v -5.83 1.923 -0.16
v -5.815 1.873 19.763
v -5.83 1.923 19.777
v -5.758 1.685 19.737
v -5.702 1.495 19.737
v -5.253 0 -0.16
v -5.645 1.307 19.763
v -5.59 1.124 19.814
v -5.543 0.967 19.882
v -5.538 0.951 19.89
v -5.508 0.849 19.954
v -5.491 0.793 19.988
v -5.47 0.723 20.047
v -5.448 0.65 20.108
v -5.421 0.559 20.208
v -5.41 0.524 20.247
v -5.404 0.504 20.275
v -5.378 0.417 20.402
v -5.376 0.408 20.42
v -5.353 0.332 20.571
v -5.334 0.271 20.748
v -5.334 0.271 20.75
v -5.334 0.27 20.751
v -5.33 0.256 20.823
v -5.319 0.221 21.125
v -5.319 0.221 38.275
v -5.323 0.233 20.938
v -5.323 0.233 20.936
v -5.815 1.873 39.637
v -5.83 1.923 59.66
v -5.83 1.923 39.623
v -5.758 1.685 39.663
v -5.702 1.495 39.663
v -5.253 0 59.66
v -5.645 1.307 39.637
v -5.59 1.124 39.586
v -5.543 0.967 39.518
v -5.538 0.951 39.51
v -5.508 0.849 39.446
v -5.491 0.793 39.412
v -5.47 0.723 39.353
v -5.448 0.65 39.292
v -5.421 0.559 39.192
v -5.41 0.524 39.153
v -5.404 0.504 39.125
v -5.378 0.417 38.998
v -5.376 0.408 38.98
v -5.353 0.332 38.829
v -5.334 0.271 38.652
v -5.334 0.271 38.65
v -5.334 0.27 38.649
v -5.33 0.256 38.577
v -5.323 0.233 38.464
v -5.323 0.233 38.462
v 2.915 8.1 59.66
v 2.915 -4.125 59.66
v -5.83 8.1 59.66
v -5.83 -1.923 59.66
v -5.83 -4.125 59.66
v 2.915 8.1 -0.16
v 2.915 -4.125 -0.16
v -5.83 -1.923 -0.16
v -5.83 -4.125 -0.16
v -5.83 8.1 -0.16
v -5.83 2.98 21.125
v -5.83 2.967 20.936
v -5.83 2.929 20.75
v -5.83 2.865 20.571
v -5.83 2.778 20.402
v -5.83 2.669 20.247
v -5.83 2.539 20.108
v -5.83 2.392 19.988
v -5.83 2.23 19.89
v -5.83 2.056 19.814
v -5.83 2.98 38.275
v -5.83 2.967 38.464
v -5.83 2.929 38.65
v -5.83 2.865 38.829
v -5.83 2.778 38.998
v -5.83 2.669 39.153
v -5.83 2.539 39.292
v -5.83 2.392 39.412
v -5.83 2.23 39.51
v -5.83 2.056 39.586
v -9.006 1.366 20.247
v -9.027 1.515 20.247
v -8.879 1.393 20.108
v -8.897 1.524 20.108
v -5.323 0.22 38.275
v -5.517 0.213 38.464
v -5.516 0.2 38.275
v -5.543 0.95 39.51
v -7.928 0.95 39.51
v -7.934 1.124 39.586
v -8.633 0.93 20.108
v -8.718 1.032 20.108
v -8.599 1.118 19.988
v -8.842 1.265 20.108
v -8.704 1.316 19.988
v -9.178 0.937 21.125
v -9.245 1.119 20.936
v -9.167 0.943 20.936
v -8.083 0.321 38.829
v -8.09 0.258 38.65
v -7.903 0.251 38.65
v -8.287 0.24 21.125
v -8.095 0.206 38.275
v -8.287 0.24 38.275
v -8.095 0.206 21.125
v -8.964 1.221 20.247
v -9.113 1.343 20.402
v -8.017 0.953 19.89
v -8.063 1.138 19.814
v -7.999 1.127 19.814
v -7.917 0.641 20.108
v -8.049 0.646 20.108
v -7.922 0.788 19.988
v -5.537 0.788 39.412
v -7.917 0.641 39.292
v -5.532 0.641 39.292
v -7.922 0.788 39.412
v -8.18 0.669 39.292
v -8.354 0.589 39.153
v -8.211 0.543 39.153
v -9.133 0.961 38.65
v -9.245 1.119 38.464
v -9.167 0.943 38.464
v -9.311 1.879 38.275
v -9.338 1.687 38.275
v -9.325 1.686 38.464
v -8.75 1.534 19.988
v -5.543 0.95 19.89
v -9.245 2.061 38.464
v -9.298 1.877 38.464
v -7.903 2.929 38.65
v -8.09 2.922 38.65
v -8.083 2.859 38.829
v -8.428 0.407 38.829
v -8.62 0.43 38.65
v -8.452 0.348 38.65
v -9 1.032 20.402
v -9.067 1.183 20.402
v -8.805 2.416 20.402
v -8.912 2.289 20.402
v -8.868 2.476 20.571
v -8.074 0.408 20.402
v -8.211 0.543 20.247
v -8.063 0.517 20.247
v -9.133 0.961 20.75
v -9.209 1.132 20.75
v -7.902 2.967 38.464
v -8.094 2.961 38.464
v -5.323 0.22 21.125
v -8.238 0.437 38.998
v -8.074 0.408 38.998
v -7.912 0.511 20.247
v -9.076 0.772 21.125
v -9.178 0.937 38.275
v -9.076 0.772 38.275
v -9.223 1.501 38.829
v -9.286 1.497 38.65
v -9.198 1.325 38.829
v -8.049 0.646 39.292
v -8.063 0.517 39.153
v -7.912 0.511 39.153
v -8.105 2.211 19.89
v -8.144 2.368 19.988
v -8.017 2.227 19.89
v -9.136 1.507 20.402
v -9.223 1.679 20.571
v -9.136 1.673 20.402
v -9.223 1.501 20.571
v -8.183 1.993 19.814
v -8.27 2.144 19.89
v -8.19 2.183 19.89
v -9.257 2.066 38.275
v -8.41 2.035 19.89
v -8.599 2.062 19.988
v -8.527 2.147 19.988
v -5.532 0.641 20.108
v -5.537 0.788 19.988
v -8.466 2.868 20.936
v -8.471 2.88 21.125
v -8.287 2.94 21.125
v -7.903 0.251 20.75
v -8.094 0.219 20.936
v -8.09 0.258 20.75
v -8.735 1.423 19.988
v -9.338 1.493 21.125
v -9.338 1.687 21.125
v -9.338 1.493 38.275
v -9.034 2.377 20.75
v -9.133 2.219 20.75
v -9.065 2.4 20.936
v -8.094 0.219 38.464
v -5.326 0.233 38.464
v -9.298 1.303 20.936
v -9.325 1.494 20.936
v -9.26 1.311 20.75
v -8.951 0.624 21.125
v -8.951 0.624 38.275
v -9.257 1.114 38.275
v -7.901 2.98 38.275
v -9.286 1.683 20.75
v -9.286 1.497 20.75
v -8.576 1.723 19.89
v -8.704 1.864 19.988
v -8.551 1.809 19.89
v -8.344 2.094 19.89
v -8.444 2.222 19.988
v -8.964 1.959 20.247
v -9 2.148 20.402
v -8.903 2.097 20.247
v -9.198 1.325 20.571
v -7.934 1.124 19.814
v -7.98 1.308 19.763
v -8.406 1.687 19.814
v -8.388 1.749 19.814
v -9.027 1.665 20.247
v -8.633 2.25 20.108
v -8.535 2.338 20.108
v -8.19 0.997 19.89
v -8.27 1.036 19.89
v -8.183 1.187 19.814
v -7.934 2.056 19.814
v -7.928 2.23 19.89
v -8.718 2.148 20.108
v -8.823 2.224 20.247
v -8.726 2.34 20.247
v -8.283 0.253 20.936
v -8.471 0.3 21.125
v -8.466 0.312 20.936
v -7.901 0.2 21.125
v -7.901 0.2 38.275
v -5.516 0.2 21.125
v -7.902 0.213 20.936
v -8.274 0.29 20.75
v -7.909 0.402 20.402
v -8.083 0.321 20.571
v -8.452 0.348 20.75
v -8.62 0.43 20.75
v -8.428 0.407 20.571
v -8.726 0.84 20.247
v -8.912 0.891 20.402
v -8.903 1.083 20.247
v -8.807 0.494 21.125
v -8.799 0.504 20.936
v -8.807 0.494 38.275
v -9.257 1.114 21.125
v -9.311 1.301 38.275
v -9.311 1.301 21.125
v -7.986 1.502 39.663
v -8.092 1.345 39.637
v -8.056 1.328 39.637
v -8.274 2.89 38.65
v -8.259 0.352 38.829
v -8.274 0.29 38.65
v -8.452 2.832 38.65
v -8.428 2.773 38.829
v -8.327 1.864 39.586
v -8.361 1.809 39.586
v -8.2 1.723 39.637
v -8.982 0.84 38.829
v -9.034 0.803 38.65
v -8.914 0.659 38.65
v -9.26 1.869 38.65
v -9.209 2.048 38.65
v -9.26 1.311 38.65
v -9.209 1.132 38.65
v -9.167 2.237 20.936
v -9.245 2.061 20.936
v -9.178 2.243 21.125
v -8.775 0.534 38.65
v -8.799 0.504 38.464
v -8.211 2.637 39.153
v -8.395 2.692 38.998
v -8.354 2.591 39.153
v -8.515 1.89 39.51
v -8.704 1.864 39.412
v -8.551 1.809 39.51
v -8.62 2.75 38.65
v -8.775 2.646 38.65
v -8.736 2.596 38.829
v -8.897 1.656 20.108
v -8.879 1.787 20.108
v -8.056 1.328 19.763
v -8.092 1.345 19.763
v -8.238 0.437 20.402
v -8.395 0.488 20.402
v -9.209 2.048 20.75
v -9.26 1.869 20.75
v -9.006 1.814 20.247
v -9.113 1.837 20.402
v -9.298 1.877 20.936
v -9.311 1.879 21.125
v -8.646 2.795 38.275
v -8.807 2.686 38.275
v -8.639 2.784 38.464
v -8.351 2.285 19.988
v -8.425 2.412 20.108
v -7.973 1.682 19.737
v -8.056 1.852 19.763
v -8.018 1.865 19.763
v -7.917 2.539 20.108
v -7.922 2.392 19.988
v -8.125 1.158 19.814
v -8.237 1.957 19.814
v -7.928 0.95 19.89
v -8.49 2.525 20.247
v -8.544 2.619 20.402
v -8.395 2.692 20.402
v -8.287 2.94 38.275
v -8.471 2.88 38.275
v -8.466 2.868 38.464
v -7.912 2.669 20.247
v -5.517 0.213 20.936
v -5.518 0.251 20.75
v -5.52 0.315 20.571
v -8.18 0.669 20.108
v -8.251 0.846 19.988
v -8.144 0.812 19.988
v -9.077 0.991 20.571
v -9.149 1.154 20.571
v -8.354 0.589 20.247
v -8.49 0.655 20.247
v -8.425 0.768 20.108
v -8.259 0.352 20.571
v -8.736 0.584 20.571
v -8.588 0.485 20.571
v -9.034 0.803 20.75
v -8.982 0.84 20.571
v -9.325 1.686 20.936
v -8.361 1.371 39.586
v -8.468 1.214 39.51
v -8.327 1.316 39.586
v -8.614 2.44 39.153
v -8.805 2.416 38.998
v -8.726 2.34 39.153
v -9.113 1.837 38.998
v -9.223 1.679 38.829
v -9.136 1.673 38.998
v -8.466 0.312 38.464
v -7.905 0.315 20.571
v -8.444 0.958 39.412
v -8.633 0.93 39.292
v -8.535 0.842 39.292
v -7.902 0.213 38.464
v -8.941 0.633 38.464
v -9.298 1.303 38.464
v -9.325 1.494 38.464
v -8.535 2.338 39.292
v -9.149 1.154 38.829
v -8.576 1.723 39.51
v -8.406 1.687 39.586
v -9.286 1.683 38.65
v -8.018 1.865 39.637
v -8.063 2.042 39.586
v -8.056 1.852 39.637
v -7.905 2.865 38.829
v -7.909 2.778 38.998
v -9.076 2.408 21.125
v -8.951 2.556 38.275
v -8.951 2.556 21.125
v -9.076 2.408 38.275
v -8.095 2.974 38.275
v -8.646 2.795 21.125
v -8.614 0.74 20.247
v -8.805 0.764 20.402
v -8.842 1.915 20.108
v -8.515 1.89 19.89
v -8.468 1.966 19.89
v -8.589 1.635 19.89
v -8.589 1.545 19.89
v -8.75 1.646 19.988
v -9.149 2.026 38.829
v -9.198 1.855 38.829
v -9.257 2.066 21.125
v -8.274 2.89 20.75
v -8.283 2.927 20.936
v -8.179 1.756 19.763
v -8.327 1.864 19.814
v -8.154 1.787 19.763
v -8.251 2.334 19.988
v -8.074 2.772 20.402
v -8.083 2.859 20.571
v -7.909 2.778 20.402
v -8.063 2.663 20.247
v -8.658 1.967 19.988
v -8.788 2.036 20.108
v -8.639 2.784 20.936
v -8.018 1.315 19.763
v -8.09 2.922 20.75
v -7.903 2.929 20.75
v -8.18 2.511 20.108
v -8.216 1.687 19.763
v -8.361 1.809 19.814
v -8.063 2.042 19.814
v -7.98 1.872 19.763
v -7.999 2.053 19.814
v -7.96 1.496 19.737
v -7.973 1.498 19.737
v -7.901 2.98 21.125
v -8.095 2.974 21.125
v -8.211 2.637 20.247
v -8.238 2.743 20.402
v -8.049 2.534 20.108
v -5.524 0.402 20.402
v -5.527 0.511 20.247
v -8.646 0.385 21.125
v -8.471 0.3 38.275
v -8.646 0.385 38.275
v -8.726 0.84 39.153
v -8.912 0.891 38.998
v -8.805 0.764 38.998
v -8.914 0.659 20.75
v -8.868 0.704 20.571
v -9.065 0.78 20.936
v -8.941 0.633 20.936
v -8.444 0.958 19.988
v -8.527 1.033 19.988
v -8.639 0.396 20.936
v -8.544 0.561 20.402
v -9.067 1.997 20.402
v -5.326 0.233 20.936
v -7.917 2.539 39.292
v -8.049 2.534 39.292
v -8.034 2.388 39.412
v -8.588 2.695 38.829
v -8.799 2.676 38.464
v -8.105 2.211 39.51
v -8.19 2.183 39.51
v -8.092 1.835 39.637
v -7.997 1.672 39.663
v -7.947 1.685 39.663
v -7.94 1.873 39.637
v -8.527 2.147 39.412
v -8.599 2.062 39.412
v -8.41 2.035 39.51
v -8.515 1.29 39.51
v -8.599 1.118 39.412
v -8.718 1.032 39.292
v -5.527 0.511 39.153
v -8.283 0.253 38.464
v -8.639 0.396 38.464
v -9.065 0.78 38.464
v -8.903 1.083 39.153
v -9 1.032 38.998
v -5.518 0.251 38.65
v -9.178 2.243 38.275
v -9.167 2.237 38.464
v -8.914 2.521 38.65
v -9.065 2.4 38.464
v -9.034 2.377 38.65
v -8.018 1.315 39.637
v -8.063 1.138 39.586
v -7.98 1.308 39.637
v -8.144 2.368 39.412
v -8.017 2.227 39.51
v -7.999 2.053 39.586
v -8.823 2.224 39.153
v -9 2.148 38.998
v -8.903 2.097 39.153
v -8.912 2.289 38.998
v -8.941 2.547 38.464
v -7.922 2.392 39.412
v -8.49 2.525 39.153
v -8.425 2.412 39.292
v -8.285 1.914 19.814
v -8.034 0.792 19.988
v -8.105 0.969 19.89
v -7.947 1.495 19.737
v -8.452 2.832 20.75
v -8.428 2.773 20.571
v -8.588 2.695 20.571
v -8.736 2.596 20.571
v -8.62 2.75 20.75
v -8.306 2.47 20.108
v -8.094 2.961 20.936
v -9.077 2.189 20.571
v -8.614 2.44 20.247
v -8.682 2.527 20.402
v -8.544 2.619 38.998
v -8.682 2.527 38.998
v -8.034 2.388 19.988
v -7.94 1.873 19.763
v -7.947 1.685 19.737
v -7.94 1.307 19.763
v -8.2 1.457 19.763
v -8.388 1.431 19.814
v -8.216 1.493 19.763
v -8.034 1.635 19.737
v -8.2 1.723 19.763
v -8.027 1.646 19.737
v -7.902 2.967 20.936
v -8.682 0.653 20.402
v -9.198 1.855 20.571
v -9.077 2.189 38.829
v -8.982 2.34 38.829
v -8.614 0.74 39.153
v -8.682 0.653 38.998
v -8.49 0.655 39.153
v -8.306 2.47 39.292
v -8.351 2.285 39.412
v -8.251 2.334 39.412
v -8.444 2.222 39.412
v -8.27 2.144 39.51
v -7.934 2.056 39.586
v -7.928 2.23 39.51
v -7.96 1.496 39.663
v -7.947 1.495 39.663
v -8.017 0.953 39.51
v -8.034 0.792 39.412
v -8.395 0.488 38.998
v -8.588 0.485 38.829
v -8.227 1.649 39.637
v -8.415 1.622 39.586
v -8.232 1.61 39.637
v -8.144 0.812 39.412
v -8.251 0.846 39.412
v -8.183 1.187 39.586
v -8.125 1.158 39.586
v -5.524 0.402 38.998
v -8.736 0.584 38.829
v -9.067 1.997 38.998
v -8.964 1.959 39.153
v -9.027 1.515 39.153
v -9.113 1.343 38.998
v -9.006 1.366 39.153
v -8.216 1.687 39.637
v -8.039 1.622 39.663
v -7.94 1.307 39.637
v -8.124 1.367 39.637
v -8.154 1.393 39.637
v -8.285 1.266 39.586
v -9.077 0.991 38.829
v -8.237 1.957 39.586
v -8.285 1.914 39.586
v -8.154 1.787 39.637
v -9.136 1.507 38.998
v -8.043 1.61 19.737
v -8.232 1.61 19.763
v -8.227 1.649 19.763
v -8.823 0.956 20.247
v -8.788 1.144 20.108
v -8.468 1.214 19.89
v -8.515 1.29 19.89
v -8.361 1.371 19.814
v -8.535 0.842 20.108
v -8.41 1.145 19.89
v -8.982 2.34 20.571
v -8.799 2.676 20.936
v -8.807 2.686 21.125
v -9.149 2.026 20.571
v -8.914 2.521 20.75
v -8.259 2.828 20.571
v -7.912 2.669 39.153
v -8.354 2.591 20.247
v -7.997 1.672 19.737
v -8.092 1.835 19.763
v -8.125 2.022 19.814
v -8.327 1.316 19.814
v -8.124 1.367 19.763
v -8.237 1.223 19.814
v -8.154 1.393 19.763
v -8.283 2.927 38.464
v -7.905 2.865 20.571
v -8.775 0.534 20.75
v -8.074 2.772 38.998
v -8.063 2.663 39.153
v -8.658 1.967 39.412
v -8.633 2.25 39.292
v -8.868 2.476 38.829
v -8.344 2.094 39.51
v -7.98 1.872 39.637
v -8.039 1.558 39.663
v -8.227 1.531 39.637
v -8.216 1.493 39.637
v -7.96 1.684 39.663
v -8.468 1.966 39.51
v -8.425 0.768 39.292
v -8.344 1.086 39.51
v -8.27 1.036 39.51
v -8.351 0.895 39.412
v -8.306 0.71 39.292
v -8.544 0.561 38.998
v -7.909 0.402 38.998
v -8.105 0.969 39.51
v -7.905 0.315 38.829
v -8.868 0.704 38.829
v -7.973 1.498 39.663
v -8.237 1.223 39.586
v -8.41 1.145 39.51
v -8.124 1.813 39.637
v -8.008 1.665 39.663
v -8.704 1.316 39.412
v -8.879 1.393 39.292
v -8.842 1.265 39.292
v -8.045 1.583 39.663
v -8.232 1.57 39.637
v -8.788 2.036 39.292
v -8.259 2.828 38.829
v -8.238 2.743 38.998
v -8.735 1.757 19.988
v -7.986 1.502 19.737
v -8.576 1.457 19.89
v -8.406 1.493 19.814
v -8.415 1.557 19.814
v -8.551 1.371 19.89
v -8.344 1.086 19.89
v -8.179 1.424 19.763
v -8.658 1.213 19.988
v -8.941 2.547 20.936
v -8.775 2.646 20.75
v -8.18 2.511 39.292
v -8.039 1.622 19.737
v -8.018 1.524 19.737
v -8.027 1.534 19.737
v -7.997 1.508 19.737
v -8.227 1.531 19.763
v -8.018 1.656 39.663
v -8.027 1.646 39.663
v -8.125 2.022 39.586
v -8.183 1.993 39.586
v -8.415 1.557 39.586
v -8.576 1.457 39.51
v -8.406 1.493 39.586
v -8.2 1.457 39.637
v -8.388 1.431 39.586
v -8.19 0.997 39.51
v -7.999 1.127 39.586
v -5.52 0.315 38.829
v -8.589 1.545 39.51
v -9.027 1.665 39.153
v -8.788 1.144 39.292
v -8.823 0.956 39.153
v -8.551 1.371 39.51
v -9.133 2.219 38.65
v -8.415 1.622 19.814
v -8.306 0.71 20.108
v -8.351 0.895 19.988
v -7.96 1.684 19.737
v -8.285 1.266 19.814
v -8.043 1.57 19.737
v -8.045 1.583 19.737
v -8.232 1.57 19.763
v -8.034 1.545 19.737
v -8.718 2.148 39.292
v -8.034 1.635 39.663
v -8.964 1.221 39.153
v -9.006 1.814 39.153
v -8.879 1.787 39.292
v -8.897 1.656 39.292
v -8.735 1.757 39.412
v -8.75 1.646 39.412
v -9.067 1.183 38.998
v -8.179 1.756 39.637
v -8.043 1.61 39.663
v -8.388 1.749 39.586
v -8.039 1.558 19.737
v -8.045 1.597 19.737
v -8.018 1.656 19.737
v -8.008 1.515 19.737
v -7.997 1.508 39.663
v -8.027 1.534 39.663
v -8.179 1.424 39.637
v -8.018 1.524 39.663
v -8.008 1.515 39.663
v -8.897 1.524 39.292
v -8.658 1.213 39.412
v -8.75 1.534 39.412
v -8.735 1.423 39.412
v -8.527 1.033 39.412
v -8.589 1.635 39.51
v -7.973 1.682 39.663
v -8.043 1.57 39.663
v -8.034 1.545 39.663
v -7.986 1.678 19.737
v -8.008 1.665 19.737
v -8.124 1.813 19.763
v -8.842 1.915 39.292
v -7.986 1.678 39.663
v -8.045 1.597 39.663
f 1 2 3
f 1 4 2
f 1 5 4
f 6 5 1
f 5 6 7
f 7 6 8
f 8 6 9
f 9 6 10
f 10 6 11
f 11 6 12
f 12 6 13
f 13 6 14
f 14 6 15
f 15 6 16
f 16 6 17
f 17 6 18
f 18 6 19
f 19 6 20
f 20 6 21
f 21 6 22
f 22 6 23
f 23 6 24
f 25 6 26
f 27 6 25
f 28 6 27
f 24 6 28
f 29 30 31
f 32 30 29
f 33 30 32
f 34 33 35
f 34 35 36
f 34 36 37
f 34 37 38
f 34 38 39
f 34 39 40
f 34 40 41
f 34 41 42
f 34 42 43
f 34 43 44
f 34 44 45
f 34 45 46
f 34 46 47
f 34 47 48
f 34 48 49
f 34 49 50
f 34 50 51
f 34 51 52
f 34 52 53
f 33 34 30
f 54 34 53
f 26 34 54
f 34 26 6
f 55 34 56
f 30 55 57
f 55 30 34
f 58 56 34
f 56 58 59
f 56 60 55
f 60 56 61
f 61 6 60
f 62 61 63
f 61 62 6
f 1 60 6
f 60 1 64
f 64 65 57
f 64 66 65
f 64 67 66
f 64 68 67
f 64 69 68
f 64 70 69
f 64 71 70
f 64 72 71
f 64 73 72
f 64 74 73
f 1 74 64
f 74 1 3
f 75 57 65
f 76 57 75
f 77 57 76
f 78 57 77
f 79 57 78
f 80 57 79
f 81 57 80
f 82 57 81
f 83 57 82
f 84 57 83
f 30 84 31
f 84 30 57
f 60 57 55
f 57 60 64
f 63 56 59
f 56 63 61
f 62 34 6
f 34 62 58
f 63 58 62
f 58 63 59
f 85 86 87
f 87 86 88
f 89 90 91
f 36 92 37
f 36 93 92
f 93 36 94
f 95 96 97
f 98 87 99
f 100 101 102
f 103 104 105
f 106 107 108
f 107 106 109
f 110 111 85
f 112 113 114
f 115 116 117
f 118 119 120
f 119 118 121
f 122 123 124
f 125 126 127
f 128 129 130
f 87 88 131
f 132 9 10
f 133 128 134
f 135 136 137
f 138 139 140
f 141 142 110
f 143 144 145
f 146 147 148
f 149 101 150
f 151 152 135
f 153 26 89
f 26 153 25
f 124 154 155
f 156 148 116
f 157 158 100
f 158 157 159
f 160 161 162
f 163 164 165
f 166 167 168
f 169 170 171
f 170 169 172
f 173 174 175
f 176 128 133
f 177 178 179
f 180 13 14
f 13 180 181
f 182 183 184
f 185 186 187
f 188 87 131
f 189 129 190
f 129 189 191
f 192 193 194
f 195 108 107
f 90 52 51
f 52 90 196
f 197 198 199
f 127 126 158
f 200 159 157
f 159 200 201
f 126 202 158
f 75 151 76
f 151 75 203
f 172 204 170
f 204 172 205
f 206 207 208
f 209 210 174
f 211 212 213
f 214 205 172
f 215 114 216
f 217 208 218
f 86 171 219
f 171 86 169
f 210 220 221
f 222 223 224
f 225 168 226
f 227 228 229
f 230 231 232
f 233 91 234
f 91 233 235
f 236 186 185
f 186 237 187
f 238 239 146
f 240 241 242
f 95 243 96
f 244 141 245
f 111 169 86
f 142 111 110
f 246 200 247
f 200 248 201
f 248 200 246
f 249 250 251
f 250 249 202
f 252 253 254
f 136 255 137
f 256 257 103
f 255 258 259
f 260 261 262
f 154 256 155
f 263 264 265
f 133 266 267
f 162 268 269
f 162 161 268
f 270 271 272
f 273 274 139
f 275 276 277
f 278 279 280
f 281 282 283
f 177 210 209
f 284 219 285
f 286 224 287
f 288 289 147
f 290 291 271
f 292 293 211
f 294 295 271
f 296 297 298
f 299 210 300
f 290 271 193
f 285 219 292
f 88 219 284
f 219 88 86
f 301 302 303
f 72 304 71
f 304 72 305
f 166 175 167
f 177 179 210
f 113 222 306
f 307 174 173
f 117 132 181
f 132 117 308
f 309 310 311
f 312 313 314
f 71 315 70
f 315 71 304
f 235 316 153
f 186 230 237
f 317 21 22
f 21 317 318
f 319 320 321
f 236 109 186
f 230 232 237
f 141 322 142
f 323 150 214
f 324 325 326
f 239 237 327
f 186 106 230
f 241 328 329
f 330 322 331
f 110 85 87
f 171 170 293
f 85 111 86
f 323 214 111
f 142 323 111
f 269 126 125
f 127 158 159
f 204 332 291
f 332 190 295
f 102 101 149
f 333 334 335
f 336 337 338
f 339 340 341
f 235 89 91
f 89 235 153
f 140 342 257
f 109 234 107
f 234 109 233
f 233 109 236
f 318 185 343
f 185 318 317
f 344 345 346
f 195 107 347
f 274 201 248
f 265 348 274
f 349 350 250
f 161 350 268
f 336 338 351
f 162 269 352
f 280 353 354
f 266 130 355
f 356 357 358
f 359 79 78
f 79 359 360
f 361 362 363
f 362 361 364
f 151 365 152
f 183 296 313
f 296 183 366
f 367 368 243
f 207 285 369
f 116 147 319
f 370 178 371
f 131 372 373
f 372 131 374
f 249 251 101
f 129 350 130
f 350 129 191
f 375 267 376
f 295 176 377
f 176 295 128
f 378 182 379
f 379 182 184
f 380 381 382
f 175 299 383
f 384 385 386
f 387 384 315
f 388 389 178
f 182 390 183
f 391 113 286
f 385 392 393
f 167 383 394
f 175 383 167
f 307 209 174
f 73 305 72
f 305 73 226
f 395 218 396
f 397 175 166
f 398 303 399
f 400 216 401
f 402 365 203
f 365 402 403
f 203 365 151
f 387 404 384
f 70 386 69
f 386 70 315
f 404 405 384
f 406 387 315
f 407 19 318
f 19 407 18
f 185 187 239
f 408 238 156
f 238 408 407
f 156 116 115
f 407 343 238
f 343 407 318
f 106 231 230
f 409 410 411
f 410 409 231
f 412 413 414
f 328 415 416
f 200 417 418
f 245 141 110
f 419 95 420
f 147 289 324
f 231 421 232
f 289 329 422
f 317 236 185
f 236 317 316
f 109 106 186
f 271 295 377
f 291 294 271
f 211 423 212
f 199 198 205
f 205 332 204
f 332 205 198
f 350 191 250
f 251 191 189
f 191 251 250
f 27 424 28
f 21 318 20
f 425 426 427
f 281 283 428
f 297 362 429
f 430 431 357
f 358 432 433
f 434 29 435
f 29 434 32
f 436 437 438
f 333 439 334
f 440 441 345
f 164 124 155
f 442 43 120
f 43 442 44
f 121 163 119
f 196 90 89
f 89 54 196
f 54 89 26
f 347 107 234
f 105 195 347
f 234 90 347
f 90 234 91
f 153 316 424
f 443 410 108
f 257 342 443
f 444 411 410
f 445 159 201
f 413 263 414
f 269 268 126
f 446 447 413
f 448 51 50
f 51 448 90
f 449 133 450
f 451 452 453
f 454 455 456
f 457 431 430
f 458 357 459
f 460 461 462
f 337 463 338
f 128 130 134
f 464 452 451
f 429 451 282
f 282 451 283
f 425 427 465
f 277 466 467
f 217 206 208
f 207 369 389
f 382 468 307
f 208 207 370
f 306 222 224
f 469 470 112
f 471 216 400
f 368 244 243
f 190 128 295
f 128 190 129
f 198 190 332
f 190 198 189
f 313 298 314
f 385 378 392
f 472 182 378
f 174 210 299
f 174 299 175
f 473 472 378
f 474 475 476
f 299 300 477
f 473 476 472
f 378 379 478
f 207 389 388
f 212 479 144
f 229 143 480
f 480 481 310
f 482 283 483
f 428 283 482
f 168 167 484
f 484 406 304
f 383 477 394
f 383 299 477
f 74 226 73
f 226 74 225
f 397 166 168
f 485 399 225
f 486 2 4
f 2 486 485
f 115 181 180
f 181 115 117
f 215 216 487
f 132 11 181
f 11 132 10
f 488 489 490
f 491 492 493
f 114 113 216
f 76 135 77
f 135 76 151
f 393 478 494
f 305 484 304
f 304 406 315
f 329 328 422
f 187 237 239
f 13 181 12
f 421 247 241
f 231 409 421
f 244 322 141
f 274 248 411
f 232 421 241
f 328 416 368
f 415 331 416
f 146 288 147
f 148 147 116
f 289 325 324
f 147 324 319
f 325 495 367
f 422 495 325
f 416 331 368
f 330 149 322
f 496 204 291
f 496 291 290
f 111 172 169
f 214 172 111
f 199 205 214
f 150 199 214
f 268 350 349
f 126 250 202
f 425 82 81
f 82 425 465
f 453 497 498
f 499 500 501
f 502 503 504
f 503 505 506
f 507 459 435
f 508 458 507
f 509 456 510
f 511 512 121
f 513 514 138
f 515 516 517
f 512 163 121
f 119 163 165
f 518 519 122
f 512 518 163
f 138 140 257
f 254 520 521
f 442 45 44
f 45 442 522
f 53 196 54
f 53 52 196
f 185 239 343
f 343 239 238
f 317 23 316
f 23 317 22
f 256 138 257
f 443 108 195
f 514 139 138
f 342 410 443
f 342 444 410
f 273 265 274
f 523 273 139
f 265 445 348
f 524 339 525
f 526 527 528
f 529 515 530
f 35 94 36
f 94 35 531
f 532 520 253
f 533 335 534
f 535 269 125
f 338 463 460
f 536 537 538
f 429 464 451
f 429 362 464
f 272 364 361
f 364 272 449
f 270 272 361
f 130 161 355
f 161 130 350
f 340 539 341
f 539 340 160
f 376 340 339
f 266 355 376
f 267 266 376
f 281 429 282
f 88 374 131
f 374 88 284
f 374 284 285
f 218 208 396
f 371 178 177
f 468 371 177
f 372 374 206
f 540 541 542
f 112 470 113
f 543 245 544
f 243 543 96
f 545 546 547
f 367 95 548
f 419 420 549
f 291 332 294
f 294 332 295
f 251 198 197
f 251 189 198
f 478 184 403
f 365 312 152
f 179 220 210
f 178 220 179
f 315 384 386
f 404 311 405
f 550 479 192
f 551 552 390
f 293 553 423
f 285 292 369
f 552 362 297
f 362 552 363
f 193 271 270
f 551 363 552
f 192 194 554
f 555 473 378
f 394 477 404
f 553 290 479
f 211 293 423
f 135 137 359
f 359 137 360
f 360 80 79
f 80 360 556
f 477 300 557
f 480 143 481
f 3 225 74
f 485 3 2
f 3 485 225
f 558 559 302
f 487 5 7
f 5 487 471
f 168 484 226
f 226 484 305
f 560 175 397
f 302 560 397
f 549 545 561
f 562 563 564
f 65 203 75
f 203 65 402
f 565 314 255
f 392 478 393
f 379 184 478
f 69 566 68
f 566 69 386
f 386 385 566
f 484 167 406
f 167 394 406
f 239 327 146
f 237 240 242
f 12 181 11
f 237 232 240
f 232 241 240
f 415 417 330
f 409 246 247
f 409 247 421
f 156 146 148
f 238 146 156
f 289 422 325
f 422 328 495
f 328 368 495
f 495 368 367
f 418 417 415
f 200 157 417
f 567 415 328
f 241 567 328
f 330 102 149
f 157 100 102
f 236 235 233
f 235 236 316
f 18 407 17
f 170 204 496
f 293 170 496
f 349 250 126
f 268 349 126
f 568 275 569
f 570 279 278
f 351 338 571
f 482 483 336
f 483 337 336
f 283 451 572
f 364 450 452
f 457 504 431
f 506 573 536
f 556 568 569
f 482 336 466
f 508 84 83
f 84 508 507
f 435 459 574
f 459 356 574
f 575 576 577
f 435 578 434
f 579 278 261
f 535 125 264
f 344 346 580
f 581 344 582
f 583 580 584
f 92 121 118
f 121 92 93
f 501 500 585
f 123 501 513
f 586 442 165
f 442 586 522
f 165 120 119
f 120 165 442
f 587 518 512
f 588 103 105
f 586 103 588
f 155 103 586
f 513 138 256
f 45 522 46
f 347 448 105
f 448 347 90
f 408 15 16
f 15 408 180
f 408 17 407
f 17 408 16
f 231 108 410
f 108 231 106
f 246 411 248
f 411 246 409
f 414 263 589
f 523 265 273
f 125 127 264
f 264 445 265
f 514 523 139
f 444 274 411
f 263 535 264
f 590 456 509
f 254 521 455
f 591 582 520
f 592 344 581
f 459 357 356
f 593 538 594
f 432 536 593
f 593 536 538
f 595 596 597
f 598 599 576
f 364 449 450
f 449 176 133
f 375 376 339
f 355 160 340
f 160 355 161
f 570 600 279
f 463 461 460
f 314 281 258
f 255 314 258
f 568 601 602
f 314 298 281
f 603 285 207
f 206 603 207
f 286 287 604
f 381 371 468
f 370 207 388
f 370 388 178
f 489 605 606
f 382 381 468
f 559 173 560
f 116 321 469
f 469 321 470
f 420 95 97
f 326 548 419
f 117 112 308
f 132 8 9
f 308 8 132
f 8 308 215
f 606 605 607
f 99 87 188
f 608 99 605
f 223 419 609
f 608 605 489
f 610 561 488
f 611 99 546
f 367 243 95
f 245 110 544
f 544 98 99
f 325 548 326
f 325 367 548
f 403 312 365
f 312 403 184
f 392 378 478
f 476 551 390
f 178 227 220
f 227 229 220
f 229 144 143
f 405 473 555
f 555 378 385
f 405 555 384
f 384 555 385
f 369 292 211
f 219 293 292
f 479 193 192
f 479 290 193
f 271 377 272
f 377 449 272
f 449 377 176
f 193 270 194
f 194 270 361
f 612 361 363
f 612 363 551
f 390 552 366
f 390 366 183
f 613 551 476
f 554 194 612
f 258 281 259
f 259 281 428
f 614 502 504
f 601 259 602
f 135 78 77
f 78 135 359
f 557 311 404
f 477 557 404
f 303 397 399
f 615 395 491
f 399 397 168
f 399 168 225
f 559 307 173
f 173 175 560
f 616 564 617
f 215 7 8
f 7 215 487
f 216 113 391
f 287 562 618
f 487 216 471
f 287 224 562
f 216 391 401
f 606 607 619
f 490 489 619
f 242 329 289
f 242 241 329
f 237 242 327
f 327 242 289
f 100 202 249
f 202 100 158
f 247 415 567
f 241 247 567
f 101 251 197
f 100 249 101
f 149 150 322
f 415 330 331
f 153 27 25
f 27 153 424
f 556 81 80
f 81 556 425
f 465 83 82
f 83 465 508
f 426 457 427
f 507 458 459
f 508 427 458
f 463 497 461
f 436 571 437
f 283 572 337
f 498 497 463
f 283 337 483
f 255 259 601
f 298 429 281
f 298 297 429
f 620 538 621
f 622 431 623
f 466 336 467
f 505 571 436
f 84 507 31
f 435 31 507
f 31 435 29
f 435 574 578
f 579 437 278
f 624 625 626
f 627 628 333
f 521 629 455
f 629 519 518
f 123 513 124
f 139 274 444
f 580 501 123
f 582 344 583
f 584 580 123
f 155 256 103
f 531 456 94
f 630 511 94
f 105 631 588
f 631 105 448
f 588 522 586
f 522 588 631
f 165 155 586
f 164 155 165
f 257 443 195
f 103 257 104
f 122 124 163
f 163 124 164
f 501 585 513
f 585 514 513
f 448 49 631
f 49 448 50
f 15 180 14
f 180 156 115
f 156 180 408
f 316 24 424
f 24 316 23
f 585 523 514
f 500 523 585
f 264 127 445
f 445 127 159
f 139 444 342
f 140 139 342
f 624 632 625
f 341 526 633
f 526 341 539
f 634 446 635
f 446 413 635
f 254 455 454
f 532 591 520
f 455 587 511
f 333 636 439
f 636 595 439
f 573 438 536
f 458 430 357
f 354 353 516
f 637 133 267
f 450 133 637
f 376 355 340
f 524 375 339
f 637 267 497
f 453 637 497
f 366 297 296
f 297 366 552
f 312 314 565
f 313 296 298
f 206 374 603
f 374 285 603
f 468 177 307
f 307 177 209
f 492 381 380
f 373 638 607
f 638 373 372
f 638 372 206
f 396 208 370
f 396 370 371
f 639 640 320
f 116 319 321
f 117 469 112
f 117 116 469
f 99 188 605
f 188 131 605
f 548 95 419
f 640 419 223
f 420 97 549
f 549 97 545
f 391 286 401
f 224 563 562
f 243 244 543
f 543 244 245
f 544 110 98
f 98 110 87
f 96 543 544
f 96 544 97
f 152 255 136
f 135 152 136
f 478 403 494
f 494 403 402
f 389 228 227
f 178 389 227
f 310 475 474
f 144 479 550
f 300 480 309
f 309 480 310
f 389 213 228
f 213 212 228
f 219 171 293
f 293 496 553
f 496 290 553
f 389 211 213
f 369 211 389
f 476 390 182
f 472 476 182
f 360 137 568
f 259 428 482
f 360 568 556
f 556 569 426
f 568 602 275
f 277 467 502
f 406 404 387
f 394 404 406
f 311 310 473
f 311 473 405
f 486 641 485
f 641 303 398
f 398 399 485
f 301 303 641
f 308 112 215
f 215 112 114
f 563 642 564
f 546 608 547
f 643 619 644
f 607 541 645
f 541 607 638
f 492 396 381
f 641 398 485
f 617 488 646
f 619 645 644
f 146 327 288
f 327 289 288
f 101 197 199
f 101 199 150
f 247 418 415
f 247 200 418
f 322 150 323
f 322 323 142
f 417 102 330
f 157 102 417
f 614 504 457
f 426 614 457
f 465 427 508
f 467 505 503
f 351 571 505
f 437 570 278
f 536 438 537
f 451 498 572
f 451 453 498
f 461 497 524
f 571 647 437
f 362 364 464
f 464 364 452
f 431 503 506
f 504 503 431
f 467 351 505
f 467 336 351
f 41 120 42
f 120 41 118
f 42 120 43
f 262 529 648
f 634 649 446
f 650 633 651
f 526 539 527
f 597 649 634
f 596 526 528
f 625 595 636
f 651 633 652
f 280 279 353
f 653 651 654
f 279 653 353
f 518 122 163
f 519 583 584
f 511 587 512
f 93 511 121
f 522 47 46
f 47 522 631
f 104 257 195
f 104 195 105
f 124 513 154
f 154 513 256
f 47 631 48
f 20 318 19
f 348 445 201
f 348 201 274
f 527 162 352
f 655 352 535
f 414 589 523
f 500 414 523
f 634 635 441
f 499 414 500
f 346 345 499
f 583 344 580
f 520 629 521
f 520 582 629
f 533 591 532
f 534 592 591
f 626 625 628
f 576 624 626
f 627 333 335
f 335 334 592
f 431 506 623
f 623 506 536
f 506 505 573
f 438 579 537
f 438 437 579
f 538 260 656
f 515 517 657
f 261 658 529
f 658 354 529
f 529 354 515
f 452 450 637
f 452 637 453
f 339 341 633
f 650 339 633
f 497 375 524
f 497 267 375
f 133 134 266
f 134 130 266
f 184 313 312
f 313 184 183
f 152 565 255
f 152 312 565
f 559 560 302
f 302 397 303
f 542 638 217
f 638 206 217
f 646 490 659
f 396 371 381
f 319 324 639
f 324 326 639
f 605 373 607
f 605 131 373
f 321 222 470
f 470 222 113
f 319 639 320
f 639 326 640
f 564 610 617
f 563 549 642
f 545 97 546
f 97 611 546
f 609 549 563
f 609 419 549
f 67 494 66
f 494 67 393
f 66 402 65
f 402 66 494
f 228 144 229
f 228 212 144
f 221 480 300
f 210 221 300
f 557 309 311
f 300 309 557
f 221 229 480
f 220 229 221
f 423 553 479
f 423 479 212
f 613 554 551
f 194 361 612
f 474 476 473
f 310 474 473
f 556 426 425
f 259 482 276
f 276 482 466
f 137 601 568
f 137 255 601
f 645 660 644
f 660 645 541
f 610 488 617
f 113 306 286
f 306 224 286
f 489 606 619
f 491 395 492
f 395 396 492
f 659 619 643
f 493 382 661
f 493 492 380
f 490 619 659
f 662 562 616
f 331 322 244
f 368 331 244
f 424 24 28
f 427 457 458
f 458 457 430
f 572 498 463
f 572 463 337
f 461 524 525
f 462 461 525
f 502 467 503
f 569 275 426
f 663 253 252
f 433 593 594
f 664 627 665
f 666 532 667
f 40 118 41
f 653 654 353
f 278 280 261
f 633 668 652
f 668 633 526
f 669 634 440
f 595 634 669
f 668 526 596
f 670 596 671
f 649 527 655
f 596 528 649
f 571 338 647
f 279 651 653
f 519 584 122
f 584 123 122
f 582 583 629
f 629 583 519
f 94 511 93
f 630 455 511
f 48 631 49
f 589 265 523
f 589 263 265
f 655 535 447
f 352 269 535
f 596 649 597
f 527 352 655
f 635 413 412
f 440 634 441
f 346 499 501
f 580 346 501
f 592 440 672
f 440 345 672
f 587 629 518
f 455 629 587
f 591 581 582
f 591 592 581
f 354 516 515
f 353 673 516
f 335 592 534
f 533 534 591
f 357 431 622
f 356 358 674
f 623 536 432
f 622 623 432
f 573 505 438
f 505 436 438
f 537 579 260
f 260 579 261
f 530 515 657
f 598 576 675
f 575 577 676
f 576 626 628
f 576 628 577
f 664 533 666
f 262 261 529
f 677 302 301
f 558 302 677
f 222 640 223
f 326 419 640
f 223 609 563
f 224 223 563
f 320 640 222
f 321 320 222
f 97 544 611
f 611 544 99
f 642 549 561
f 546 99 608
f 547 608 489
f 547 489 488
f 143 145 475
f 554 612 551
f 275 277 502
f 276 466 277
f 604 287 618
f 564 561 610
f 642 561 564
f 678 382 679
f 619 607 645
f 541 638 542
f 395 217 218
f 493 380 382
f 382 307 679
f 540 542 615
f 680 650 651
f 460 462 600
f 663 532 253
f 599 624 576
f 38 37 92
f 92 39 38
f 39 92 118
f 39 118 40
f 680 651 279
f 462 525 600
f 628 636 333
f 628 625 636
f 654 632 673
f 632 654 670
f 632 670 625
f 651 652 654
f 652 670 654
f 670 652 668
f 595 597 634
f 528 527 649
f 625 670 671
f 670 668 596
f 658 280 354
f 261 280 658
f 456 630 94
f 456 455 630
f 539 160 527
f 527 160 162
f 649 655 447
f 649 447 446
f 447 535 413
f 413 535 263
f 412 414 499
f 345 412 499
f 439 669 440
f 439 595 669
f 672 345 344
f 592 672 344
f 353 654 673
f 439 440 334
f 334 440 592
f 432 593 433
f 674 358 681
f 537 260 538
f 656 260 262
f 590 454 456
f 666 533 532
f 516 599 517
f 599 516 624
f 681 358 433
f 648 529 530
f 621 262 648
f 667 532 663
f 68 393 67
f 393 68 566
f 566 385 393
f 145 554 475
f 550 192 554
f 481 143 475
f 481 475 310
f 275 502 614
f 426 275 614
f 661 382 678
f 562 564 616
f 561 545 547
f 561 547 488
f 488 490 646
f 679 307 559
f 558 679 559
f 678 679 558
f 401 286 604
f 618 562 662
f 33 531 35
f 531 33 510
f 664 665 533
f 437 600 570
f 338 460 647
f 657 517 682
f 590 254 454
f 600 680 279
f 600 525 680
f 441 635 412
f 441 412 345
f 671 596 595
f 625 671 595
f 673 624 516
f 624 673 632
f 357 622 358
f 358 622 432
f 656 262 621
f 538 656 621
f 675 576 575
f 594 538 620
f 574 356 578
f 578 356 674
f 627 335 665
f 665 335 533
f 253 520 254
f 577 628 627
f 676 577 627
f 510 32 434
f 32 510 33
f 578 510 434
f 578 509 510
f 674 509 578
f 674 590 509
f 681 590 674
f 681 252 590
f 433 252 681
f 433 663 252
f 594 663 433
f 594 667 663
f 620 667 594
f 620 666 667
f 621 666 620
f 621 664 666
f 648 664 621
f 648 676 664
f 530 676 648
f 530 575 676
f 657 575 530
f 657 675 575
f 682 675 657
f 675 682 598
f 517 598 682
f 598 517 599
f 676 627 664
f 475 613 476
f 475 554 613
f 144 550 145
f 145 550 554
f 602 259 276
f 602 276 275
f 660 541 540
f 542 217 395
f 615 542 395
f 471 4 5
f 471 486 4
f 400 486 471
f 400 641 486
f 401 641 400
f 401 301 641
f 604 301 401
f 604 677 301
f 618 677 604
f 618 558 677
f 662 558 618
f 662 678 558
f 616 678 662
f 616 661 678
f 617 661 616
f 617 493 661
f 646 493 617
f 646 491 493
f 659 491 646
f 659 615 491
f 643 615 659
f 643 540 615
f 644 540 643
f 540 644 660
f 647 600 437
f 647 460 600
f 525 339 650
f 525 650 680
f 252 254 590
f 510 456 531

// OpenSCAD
$fn            = 45;
TOLERANCE      =  0.42;
THICKNESS      =  3.975;
LAYER_HEIGHT   =  9.9;
LINE_THICKNESS =  0.84 +0.26; // <== TUNE for a 1-line wall
WALL_THICKNESS =  0.75;
SUPPORT_D      =  0.50;

//                   V2.0   V2.1
HINGE_EXTRA_LENGTH = 1.2  - 1.2;

ATOM           =  0.001;
TOLERANCE2     = TOLERANCE +.5 /5;

module p0(h=LAYER_HEIGHT, is_top=false, is_bottom=false, is_left=false, is_right=false, extra_length=0) {
    difference() {
        intersection() {
            union() {
                // column
                if (!is_left)
                   cylinder(d=THICKNESS, h=h);
                
                // block
                translate([0, -THICKNESS/2, 0])
                cube([THICKNESS*1.5-TOLERANCE2+extra_length, THICKNESS, h]);
            }
            
            // sharpen column
            translate([0, 0, -THICKNESS/4]){
                d2 = h*6;
                d1 = is_bottom || is_left ? d2 : 0;
                
                translate([0, 0, .2])  // <== FIXME: compute
                cylinder(d1=d1, d2=d2, h=h*2);
                
                translate([THICKNESS/2+TOLERANCE2, -THICKNESS/2, 0])
                cube([THICKNESS/2*2, THICKNESS, h*2]);
            }
        }

        // pin hole
        if (!is_top && !is_left) {
            d2 = THICKNESS - LINE_THICKNESS;
            d1 = d2;
            hh = d2*.7;
            
            translate([0, 0, h-hh+ATOM])
            cylinder(d1=d1, d2=d2, h=hh);
            
            translate([0, -d2/2, h-hh+ATOM])
            cube([d2/2, d2, hh]);
            
            // shave 1-2 layers 
            translate([-THICKNESS*1.5+TOLERANCE2, -THICKNESS, h-TOLERANCE])
            cube([THICKNESS*2, THICKNESS*2, THICKNESS]);
        }
    }
    
    // pin
    if (!is_top && !is_left) {
        d = THICKNESS - LINE_THICKNESS;
        dd = d - TOLERANCE*2;
        hh = dd*.7 - TOLERANCE -.5;
        z_adjust = .4 +.2; //+.3  -.1;
        
        translate([0, 0, h+z_adjust-d])
        cylinder(d1=0, d2=dd, h=hh);
        
        translate([0, 0, h+z_adjust-d +hh])
        cylinder(d=dd, h=dd);
        
        translate([0, 0, h+z_adjust-d])
        cylinder(d=SUPPORT_D, h=dd/2); // support pin
    }
}

module p1(h=LAYER_HEIGHT, is_bottom=false, is_top=false, is_left=false, is_right=false, extra_length=0) {
    translate([-extra_length, 0, 0])
    p0(h=h, is_bottom=is_bottom, is_left=is_left, is_right=is_right, extra_length=extra_length);
    
    if (!is_right) {
        translate([THICKNESS*2, 0, h]) rotate([0, 0, 180])
        p0(h=h, is_top=is_top, extra_length=extra_length);
    }
    else {
        translate([THICKNESS/2+TOLERANCE2, -THICKNESS/2, h])
        cube([THICKNESS-TOLERANCE2*2, THICKNESS, h]);
    }
}

module p2(h=LAYER_HEIGHT, extent=0,
          is_bottom=false, is_top=false, is_left=false, is_right=false, extra_length=0) {
    difference() {
        p1(h=h, is_bottom=is_bottom, is_top=is_top, is_left=is_left, is_right=is_right,
           extra_length=extra_length);
       
        if (is_left)
            translate([-ATOM, -THICKNESS/2-ATOM, -ATOM])
            cube([THICKNESS/2+ATOM, THICKNESS+ATOM*2, h*2+ATOM*2]);
        
        if (is_left)
            translate([THICKNESS/2, -THICKNESS, -ATOM])
            cube([THICKNESS/2, THICKNESS*2, h*2+ATOM*2]);
        
        if (is_right)
            translate([THICKNESS, -THICKNESS, -ATOM])
            cube([THICKNESS/2, THICKNESS*2, h*2+ATOM*2]);
    }

    if (is_left)
        translate([THICKNESS-extent, -THICKNESS/2, -ATOM])
        cube([extent, THICKNESS, h*2]);

    if (is_right)
        translate([THICKNESS, -THICKNESS/2, -ATOM])
        cube([extent, THICKNESS, h*2]);

}

module cut() {
    if ($preview && false) {
        intersection() {
            d = 100;
            
            translate([-d/2, 0, 0])
            cube(d);
            
            children();
        }
    }
    else children();
}

module sample(extent=0) {
    cut() {
        translate([THICKNESS*0, 0, 0])              p2(extent=extent, is_bottom=true, is_left=true);
        translate([THICKNESS*0, 0, LAYER_HEIGHT*2]) p2(extent=extent, is_left=true);
        translate([THICKNESS*0, 0, LAYER_HEIGHT*4]) p2(extent=extent, is_top=true, is_left=true);

        translate([THICKNESS*2, 0, 0])              p2(extent=extent, is_bottom=true);
        translate([THICKNESS*2, 0, LAYER_HEIGHT*2]) p2(extent=extent);
        translate([THICKNESS*2, 0, LAYER_HEIGHT*4]) p2(extent=extent, is_top=true);

        translate([THICKNESS*4, 0, 0])              p2(extent=extent, is_bottom=true, is_right=true);
        translate([THICKNESS*4, 0, LAYER_HEIGHT*2]) p2(extent=extent, is_right=true);
        translate([THICKNESS*4, 0, LAYER_HEIGHT*4]) p2(extent=extent, is_top=true, is_right=true);
    }

    L = 10;
    translate([-L+THICKNESS, THICKNESS/2-WALL_THICKNESS, 0])
    cube([L, WALL_THICKNESS, LAYER_HEIGHT*6]);

    translate([THICKNESS*5, THICKNESS/2-WALL_THICKNESS, 0])
    cube([L, WALL_THICKNESS, LAYER_HEIGHT*6]);
}

////////////////////////////////////////////////////////////////////////////////
// Hinge 1

module hinge(extent=0, x_shift=0, nb_layers=4, layer_height=LAYER_HEIGHT, extra_length=HINGE_EXTRA_LENGTH) {
    
    //x_shift = -3.48;
    echo("hinge extent      :", extent);
    echo("hinge x_shift     :", x_shift);
    echo("hinge extra_length:", extra_length);
    for (i=[0:nb_layers-1]) {

        translate([x_shift, -THICKNESS, 0])
        rotate([0, 0, 180])
        translate([-THICKNESS*2, 0, 0])
        translate([0, 0, layer_height*2*i])
        p2(h=layer_height, extent=extent, is_left=true, is_bottom=i==0, is_top=i==nb_layers-1);

        translate([x_shift, -THICKNESS+extra_length, 0])
        rotate([0, 0, 90])
        translate([0, 0, layer_height*2*i])
        p2(h=layer_height, extent=extent, is_bottom=i==0, is_top=i==nb_layers-1,
           extra_length=extra_length);

        translate([0, 0, layer_height*2*i])
        translate([-THICKNESS/2+x_shift, -THICKNESS/2+TOLERANCE, 0])
        cube([THICKNESS, THICKNESS-TOLERANCE*2+extra_length, layer_height*2]);

        translate([x_shift, THICKNESS+extra_length, 0])
        translate([0, 0, layer_height*2*i])
        p2(h=layer_height, extent=extent, is_right=true,
           is_bottom=i==0, is_top=i==nb_layers-1);
    }
}

////////////////////////////////////////////////////////////////////////////////
// Hinge 2

module hinge2_half1(extent=0, x_shift=0, nb_layers=3, layer_height=LAYER_HEIGHT) {
    intersection() {
        for (i=[0:nb_layers-1]) {

            translate([x_shift, 0, 0])
            rotate([0, 0, 180])
            translate([-THICKNESS*2, 0, 0])
            translate([0, 0, layer_height*2*i])
            p2(extent=extent, is_left=true, h=layer_height, is_bottom=i==0, is_top=i==nb_layers-1);
        }

        translate([-extent - THICKNESS/2, -THICKNESS/2, THICKNESS/2])
        cube([extent*2+THICKNESS, THICKNESS, layer_height*2*nb_layers-THICKNESS]);
    }

    // rounded frame
    zbot = THICKNESS/2;
    ztop = layer_height*2*nb_layers - THICKNESS/2;
    zside = extent+THICKNESS/2;
    hull() {
        translate([0, 0, ztop])
        sphere(d=THICKNESS);

        translate([zside, 0, ztop])
        sphere(d=THICKNESS);
    }
    hull() {
        translate([zside, 0, ztop])
        sphere(d=THICKNESS);

        translate([zside, 0, zbot])
        sphere(d=THICKNESS);
    }
    difference() {
        hull() {
            translate([zside, 0, zbot])
            sphere(d=THICKNESS);
            
            translate([0, 0, zbot])
            sphere(d=THICKNESS);
        }
        translate([-THICKNESS*1.5 + TOLERANCE2, -THICKNESS, -THICKNESS/2+zbot])
        cube([THICKNESS*2, THICKNESS*2, THICKNESS]);
    }

}

module maybe_hull(doit) {
    if (doit) hull() children();
    else children();
}

module hinge2_half2(extent=0, x_shift=0, nb_layers=3, layer_height=LAYER_HEIGHT,
                    frame_only=false) {
    zbot = THICKNESS/2;
    ztop = layer_height*2*nb_layers - THICKNESS/2;
    zside = extent+THICKNESS/2;
    difference() {
        maybe_hull(frame_only) union() {
            if (!frame_only)
            intersection() {
                for (i=[0:nb_layers-1]) {
                    translate([x_shift, 0, 0])
                    rotate([0, 0, 180])
                    translate([0, 0, layer_height*2*i])
                    p2(extent=extent, is_right=true, h=layer_height, is_bottom=i==0, is_top=i==nb_layers-1);
                }
                translate([-extent - THICKNESS/2, -THICKNESS/2, THICKNESS/2])
                cube([extent*2+THICKNESS, THICKNESS, layer_height*2*nb_layers-THICKNESS]);
            }

            // rounded frame
            difference() {
                hull() {
                    translate([0, 0, zbot])
                    sphere(d=THICKNESS);

                    translate([-zside, 0, zbot])
                    sphere(d=THICKNESS);
                }
                translate([-THICKNESS/2, -THICKNESS/2, THICKNESS/2])
                cube([THICKNESS, THICKNESS, THICKNESS]);
            }
            hull() {
                translate([-zside, 0, zbot])
                sphere(d=THICKNESS);

                translate([-zside, 0, ztop])
                sphere(d=THICKNESS);
            }
            difference() {
                hull() {
                    translate([-zside, 0, ztop])
                    sphere(d=THICKNESS);
                    
                    translate([0, 0, ztop])
                    sphere(d=THICKNESS);
                }
                if (!frame_only) {
                    translate([-THICKNESS*.5 - TOLERANCE2, -THICKNESS, layer_height*2*nb_layers-THICKNESS])
                    cube([THICKNESS*2, THICKNESS*2, THICKNESS]);
                }
            }

            hull() {
                // enlarge laterally
                translate([frame_only ? THICKNESS/4 -.5: -THICKNESS*2, 0, zbot])
                sphere(d=THICKNESS);
                
                translate([frame_only ? THICKNESS/4 -.5: -THICKNESS*2, 0, ztop])
                sphere(d=THICKNESS);

                translate([-zside-THICKNESS/2, 0, zbot])
                sphere(d=THICKNESS);
                
                translate([-zside-THICKNESS/2, 0, ztop])
                sphere(d=THICKNESS);

                translate([-zside - THICKNESS/2, 0, ztop - THICKNESS/2])
                cylinder(d=THICKNESS, h=THICKNESS);

                if (frame_only) {
                    translate([THICKNESS/4 -.5, 0, ztop - THICKNESS/2])
                    cylinder(d=THICKNESS, h=THICKNESS);
                }
                else {
                    translate([-THICKNESS - TOLERANCE2, 0, ztop + THICKNESS/4])
                    cube([THICKNESS, THICKNESS, THICKNESS/2], center=true);
                }
            }
            if (0 && frame_only) {
                w = THICKNESS *2.25 + extent -1;
                translate([-w + THICKNESS*.75 -.5, THICKNESS * .5, 0])
                cube([w, THICKNESS, ztop + THICKNESS/2]);
            }
        }
        // chamfer
        chamfer(zside, layer_height, nb_layers);
        //groove(extent, layer_height, nb_layers);
    }
}

module chamfer(zside, layer_height, nb_layers) {
    ztop = layer_height*2*nb_layers - THICKNESS/2;
    intersection() {
        translate([-zside -THICKNESS*.95, 0, 0])
        scale([.3, 1, 1])
        rotate([0, 0, -45])
        translate([-THICKNESS/2, -THICKNESS/2, -ztop/2])        
        cube([THICKNESS, THICKNESS, ztop*2]);
    }
}

module groove(extent, layer_height, nb_layers) {
    ztop = layer_height*2*nb_layers - THICKNESS/2;
    zside = extent+THICKNESS/2;
    up = ztop-THICKNESS/2*0 - ztop/3;
    down = THICKNESS/2 + ztop/3;
    hull() {
        translate([-zside -THICKNESS*.9, THICKNESS/2.5, up])
        sphere(d=THICKNESS*.7);
        
        translate([-zside -THICKNESS*.9, THICKNESS/2.5, down])
        sphere(d=THICKNESS*.7);


        translate([-zside -THICKNESS*1.5, THICKNESS/2.5, up])
        sphere(d=THICKNESS*.7);
        
        translate([-zside -THICKNESS*1.5, THICKNESS/2.5, down])
        sphere(d=THICKNESS*.7);

    }
}

module hinge2_half2_cutout(extent=0, x_shift=0, nb_layers=3, layer_height=LAYER_HEIGHT, frame_only=false) {
    zbot = THICKNESS/2;
    ztop = layer_height*2*nb_layers;
    zside = extent+THICKNESS/2;
    w = extent + THICKNESS*2 + TOLERANCE;
    t = THICKNESS * 1.5;

    difference() {
        union() {
            translate([-w + THICKNESS/2 + TOLERANCE*2, 0, 0])
            cube([w, THICKNESS, ztop]);

            translate([-w + THICKNESS/2 + TOLERANCE*2, -THICKNESS, 0])
            cube([w, THICKNESS*3, ztop]);

            /*
            hull() {
                translate([-extent-THICKNESS, 0, 0])
                cylinder(d=THICKNESS, h=ztop);
                translate([-THICKNESS/2+TOLERANCE*2, -THICKNESS/2, 0])
                cube([THICKNESS, THICKNESS, ztop]);
            }*/
        }

        // chamfer
        chamfer(zside, layer_height, nb_layers);
    }
}

module hinge2(extent=0, x_shift=0, nb_layers=3, layer_height=LAYER_HEIGHT) {
    hinge2_half1(extent/2, x_shift, nb_layers, layer_height);
    hinge2_half2(extent, x_shift, nb_layers, layer_height);
}

module hinge2_cutout(extent=0, x_shift=0, nb_layers=3, layer_height=LAYER_HEIGHT, extra=.3) {
    minkowski() {
        hinge2_half2_cutout(extent, x_shift, nb_layers, layer_height, frame_only=true);

        translate([-.1, 0, .05])
        scale([1.25, 1, 1.4])
        cube(extra, center=true);
    }
    groove(extent, layer_height, nb_layers);
}

////////////////////////////////////////////////////////////////////////////////

function get_hinge_thickness() = THICKNESS;

function get_hinge_height(nb_layers=3, layer_height=LAYER_HEIGHT) = layer_height*2*nb_layers;
//sample(extent=5);

if (0) {
    intersection() {
        hinge(extent=10, nb_layers=2);
        cylinder(r=100, h=LAYER_HEIGHT*4+8+.3);
    }
}

if (0) {
    %hinge2_cutout(extent=10, layer_height=6);
    //translate([0, -THICKNESS*3, 0])
    hinge2(extent=10, layer_height=6);
}

if (0) {
    hinge();
}

if (1) hinge2_cutout();
